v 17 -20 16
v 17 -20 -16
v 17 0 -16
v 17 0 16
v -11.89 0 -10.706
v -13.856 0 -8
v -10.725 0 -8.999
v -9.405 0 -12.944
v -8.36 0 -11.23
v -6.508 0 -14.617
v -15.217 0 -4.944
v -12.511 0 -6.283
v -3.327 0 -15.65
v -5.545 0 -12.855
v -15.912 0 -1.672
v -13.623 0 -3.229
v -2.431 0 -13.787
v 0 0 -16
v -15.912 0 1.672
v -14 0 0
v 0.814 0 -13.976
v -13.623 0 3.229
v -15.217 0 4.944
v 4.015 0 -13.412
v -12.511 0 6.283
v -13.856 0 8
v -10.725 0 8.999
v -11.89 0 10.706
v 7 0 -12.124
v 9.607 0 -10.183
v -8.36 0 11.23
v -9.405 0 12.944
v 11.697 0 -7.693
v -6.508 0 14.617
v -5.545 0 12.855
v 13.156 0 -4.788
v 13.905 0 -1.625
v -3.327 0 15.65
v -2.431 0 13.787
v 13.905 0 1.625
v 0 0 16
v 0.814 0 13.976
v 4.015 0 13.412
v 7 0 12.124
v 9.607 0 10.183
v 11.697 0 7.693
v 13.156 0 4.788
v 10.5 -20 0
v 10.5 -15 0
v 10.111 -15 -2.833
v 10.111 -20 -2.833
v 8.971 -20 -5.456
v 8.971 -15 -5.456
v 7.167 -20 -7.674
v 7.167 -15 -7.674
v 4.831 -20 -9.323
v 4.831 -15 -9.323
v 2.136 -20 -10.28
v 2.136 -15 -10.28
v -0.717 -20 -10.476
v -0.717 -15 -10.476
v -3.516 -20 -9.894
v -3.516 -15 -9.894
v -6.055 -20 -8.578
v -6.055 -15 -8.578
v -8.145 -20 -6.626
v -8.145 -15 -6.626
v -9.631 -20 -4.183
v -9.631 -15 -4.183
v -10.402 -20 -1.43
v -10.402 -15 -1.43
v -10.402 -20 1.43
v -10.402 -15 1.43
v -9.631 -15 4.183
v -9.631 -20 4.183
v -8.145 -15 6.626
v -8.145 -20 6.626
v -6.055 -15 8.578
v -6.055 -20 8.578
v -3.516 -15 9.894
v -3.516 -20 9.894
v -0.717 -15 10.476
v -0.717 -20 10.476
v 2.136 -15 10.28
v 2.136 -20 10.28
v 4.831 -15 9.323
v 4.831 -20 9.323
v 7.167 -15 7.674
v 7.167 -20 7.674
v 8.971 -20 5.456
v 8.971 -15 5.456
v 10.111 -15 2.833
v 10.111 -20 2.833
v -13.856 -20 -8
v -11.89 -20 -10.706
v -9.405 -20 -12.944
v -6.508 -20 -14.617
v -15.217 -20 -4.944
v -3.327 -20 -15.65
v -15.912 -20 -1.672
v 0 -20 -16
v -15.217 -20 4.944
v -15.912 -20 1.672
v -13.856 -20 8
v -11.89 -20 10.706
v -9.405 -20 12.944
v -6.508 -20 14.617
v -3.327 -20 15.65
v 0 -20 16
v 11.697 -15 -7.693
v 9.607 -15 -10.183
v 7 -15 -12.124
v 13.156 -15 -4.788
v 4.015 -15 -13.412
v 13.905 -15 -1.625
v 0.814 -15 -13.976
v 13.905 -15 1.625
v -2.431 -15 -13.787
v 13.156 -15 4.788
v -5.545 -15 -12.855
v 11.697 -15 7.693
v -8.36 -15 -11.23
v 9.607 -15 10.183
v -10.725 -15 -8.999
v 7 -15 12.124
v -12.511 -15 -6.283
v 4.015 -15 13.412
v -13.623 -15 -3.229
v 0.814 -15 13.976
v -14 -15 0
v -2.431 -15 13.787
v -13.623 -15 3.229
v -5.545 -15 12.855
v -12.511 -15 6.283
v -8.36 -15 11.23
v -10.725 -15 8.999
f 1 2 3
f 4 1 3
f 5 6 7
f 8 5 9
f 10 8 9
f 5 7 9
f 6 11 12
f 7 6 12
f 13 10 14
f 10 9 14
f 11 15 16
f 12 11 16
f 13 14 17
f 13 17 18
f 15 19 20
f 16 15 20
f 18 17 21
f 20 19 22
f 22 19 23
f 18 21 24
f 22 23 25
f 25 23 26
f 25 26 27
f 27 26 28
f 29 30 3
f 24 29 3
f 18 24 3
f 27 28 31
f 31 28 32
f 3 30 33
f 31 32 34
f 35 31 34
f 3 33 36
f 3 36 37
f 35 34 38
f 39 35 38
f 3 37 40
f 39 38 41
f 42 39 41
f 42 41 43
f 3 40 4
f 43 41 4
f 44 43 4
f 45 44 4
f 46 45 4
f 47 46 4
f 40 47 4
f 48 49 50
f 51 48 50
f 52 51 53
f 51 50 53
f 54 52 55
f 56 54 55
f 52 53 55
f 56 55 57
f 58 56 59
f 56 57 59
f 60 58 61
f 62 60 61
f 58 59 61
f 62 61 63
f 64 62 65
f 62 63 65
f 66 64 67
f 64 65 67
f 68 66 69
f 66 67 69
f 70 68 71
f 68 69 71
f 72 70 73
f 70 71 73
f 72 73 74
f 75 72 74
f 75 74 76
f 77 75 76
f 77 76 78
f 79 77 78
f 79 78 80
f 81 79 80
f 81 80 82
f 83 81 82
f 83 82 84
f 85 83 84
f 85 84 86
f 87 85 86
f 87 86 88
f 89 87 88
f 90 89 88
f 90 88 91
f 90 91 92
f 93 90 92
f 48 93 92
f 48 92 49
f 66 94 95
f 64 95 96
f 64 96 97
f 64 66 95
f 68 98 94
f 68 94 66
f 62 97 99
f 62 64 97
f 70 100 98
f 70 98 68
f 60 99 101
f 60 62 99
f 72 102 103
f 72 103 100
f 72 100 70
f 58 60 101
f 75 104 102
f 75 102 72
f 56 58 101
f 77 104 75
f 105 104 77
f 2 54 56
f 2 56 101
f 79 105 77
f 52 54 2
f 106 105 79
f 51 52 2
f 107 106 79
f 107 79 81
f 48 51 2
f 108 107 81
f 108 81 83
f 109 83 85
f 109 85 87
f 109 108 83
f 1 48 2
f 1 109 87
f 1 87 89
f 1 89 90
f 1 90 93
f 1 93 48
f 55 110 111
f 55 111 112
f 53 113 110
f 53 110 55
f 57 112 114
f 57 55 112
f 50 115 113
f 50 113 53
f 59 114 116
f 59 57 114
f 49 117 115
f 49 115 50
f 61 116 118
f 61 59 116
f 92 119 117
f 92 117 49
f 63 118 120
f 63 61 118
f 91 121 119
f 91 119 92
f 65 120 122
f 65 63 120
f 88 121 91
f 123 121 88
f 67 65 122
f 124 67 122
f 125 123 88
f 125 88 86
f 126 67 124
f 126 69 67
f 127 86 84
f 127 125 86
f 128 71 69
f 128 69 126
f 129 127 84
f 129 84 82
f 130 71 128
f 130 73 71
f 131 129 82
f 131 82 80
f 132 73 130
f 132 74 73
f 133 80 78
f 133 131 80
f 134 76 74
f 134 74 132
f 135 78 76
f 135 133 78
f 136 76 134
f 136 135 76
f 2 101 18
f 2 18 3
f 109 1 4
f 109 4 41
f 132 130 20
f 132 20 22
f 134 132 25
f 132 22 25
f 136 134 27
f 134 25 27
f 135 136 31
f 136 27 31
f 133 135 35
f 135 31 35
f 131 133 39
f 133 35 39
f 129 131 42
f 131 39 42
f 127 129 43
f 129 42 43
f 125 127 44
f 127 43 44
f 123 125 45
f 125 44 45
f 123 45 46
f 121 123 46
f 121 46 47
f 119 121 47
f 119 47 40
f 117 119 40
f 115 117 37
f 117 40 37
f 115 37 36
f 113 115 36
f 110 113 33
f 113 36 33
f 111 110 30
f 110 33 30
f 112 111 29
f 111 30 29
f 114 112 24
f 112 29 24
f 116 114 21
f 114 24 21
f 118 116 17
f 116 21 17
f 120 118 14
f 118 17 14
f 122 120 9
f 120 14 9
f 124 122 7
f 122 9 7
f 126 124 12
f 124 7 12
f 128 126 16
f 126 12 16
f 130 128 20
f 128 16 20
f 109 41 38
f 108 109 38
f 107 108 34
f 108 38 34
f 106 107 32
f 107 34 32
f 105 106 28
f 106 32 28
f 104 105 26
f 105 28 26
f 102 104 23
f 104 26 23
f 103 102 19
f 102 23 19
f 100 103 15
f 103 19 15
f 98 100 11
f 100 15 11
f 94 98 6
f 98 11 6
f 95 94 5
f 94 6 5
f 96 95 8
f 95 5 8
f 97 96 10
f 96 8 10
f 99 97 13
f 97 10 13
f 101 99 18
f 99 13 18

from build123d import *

# Parameters (mm, degrees)
F0_R      = 16
F0_R_2    = 10.5
F1_DEPTH  = 20
F2_R      = 12.5
F3_DEPTH  = 15
F4_DEPTH  = 15.001
F5_R      = 14
F6_DEPTH  = 15
F8_W      = 20
F8_H      = 16
F9_DEPTH  = 2
F11_DEPTH = 20
F14_DEPTH = 20


with BuildPart() as f1:
    # F0 (on Front) → F1 (new body)
    with BuildSketch(Plane.XZ):
        Circle(F0_R)
        Circle(F0_R_2, mode=Mode.SUBTRACT)
    extrude(amount=F1_DEPTH)

    # F2 (on face) → F3 (join)
    with BuildSketch(Plane.XZ.offset(20)):
        Circle(F2_R)
    extrude(amount=-F3_DEPTH)

    # F4 (cut, through all): a face of the model
    f4_faces = [f1.faces().sort_by_distance(p)[0] for p in [
        (0, -5, 0),
    ]]
    extrude(f4_faces, amount=-F4_DEPTH, mode=Mode.SUBTRACT)

    # F5 (on face) → F6 (cut)
    with BuildSketch(Plane(origin=(0, 0, 0), x_dir=(-1, 0, 0), z_dir=(0, 1, 0))):
        Circle(F5_R)
    extrude(amount=-F6_DEPTH, mode=Mode.SUBTRACT)

    # F8 (on offset) → F9 (join)
    with BuildSketch(Plane.YZ.offset(15)):
        with Locations((-10, -8)):
            Rectangle(F8_W, F8_H)
        with Locations((-10, 8)):
            Rectangle(F8_W, F8_H)
    extrude(amount=F9_DEPTH)

    # F10 (on face) → F11 (join)
    with BuildSketch(Plane.XZ.offset(20)):
        with BuildLine():
            Line((15, 16), (0, 16))
            ThreePointArc((0, 16), (9.1355287257, 13.1355287257), (15, 5.5677643628))
            Line((15, 5.5677643628), (15, 16))
        make_face()
    extrude(amount=-F11_DEPTH)

    # F13 (on face) → F14 (join)
    with BuildSketch(Plane.XZ.offset(20)):
        with BuildLine():
            Line((0, -16), (15, -16))
            Line((15, -16), (15, -5.5677643628))
            ThreePointArc((15, -5.5677643628), (9.1355287257, -13.1355287257), (0, -16))
        make_face()
    extrude(amount=-F14_DEPTH)


solid = f1.part
